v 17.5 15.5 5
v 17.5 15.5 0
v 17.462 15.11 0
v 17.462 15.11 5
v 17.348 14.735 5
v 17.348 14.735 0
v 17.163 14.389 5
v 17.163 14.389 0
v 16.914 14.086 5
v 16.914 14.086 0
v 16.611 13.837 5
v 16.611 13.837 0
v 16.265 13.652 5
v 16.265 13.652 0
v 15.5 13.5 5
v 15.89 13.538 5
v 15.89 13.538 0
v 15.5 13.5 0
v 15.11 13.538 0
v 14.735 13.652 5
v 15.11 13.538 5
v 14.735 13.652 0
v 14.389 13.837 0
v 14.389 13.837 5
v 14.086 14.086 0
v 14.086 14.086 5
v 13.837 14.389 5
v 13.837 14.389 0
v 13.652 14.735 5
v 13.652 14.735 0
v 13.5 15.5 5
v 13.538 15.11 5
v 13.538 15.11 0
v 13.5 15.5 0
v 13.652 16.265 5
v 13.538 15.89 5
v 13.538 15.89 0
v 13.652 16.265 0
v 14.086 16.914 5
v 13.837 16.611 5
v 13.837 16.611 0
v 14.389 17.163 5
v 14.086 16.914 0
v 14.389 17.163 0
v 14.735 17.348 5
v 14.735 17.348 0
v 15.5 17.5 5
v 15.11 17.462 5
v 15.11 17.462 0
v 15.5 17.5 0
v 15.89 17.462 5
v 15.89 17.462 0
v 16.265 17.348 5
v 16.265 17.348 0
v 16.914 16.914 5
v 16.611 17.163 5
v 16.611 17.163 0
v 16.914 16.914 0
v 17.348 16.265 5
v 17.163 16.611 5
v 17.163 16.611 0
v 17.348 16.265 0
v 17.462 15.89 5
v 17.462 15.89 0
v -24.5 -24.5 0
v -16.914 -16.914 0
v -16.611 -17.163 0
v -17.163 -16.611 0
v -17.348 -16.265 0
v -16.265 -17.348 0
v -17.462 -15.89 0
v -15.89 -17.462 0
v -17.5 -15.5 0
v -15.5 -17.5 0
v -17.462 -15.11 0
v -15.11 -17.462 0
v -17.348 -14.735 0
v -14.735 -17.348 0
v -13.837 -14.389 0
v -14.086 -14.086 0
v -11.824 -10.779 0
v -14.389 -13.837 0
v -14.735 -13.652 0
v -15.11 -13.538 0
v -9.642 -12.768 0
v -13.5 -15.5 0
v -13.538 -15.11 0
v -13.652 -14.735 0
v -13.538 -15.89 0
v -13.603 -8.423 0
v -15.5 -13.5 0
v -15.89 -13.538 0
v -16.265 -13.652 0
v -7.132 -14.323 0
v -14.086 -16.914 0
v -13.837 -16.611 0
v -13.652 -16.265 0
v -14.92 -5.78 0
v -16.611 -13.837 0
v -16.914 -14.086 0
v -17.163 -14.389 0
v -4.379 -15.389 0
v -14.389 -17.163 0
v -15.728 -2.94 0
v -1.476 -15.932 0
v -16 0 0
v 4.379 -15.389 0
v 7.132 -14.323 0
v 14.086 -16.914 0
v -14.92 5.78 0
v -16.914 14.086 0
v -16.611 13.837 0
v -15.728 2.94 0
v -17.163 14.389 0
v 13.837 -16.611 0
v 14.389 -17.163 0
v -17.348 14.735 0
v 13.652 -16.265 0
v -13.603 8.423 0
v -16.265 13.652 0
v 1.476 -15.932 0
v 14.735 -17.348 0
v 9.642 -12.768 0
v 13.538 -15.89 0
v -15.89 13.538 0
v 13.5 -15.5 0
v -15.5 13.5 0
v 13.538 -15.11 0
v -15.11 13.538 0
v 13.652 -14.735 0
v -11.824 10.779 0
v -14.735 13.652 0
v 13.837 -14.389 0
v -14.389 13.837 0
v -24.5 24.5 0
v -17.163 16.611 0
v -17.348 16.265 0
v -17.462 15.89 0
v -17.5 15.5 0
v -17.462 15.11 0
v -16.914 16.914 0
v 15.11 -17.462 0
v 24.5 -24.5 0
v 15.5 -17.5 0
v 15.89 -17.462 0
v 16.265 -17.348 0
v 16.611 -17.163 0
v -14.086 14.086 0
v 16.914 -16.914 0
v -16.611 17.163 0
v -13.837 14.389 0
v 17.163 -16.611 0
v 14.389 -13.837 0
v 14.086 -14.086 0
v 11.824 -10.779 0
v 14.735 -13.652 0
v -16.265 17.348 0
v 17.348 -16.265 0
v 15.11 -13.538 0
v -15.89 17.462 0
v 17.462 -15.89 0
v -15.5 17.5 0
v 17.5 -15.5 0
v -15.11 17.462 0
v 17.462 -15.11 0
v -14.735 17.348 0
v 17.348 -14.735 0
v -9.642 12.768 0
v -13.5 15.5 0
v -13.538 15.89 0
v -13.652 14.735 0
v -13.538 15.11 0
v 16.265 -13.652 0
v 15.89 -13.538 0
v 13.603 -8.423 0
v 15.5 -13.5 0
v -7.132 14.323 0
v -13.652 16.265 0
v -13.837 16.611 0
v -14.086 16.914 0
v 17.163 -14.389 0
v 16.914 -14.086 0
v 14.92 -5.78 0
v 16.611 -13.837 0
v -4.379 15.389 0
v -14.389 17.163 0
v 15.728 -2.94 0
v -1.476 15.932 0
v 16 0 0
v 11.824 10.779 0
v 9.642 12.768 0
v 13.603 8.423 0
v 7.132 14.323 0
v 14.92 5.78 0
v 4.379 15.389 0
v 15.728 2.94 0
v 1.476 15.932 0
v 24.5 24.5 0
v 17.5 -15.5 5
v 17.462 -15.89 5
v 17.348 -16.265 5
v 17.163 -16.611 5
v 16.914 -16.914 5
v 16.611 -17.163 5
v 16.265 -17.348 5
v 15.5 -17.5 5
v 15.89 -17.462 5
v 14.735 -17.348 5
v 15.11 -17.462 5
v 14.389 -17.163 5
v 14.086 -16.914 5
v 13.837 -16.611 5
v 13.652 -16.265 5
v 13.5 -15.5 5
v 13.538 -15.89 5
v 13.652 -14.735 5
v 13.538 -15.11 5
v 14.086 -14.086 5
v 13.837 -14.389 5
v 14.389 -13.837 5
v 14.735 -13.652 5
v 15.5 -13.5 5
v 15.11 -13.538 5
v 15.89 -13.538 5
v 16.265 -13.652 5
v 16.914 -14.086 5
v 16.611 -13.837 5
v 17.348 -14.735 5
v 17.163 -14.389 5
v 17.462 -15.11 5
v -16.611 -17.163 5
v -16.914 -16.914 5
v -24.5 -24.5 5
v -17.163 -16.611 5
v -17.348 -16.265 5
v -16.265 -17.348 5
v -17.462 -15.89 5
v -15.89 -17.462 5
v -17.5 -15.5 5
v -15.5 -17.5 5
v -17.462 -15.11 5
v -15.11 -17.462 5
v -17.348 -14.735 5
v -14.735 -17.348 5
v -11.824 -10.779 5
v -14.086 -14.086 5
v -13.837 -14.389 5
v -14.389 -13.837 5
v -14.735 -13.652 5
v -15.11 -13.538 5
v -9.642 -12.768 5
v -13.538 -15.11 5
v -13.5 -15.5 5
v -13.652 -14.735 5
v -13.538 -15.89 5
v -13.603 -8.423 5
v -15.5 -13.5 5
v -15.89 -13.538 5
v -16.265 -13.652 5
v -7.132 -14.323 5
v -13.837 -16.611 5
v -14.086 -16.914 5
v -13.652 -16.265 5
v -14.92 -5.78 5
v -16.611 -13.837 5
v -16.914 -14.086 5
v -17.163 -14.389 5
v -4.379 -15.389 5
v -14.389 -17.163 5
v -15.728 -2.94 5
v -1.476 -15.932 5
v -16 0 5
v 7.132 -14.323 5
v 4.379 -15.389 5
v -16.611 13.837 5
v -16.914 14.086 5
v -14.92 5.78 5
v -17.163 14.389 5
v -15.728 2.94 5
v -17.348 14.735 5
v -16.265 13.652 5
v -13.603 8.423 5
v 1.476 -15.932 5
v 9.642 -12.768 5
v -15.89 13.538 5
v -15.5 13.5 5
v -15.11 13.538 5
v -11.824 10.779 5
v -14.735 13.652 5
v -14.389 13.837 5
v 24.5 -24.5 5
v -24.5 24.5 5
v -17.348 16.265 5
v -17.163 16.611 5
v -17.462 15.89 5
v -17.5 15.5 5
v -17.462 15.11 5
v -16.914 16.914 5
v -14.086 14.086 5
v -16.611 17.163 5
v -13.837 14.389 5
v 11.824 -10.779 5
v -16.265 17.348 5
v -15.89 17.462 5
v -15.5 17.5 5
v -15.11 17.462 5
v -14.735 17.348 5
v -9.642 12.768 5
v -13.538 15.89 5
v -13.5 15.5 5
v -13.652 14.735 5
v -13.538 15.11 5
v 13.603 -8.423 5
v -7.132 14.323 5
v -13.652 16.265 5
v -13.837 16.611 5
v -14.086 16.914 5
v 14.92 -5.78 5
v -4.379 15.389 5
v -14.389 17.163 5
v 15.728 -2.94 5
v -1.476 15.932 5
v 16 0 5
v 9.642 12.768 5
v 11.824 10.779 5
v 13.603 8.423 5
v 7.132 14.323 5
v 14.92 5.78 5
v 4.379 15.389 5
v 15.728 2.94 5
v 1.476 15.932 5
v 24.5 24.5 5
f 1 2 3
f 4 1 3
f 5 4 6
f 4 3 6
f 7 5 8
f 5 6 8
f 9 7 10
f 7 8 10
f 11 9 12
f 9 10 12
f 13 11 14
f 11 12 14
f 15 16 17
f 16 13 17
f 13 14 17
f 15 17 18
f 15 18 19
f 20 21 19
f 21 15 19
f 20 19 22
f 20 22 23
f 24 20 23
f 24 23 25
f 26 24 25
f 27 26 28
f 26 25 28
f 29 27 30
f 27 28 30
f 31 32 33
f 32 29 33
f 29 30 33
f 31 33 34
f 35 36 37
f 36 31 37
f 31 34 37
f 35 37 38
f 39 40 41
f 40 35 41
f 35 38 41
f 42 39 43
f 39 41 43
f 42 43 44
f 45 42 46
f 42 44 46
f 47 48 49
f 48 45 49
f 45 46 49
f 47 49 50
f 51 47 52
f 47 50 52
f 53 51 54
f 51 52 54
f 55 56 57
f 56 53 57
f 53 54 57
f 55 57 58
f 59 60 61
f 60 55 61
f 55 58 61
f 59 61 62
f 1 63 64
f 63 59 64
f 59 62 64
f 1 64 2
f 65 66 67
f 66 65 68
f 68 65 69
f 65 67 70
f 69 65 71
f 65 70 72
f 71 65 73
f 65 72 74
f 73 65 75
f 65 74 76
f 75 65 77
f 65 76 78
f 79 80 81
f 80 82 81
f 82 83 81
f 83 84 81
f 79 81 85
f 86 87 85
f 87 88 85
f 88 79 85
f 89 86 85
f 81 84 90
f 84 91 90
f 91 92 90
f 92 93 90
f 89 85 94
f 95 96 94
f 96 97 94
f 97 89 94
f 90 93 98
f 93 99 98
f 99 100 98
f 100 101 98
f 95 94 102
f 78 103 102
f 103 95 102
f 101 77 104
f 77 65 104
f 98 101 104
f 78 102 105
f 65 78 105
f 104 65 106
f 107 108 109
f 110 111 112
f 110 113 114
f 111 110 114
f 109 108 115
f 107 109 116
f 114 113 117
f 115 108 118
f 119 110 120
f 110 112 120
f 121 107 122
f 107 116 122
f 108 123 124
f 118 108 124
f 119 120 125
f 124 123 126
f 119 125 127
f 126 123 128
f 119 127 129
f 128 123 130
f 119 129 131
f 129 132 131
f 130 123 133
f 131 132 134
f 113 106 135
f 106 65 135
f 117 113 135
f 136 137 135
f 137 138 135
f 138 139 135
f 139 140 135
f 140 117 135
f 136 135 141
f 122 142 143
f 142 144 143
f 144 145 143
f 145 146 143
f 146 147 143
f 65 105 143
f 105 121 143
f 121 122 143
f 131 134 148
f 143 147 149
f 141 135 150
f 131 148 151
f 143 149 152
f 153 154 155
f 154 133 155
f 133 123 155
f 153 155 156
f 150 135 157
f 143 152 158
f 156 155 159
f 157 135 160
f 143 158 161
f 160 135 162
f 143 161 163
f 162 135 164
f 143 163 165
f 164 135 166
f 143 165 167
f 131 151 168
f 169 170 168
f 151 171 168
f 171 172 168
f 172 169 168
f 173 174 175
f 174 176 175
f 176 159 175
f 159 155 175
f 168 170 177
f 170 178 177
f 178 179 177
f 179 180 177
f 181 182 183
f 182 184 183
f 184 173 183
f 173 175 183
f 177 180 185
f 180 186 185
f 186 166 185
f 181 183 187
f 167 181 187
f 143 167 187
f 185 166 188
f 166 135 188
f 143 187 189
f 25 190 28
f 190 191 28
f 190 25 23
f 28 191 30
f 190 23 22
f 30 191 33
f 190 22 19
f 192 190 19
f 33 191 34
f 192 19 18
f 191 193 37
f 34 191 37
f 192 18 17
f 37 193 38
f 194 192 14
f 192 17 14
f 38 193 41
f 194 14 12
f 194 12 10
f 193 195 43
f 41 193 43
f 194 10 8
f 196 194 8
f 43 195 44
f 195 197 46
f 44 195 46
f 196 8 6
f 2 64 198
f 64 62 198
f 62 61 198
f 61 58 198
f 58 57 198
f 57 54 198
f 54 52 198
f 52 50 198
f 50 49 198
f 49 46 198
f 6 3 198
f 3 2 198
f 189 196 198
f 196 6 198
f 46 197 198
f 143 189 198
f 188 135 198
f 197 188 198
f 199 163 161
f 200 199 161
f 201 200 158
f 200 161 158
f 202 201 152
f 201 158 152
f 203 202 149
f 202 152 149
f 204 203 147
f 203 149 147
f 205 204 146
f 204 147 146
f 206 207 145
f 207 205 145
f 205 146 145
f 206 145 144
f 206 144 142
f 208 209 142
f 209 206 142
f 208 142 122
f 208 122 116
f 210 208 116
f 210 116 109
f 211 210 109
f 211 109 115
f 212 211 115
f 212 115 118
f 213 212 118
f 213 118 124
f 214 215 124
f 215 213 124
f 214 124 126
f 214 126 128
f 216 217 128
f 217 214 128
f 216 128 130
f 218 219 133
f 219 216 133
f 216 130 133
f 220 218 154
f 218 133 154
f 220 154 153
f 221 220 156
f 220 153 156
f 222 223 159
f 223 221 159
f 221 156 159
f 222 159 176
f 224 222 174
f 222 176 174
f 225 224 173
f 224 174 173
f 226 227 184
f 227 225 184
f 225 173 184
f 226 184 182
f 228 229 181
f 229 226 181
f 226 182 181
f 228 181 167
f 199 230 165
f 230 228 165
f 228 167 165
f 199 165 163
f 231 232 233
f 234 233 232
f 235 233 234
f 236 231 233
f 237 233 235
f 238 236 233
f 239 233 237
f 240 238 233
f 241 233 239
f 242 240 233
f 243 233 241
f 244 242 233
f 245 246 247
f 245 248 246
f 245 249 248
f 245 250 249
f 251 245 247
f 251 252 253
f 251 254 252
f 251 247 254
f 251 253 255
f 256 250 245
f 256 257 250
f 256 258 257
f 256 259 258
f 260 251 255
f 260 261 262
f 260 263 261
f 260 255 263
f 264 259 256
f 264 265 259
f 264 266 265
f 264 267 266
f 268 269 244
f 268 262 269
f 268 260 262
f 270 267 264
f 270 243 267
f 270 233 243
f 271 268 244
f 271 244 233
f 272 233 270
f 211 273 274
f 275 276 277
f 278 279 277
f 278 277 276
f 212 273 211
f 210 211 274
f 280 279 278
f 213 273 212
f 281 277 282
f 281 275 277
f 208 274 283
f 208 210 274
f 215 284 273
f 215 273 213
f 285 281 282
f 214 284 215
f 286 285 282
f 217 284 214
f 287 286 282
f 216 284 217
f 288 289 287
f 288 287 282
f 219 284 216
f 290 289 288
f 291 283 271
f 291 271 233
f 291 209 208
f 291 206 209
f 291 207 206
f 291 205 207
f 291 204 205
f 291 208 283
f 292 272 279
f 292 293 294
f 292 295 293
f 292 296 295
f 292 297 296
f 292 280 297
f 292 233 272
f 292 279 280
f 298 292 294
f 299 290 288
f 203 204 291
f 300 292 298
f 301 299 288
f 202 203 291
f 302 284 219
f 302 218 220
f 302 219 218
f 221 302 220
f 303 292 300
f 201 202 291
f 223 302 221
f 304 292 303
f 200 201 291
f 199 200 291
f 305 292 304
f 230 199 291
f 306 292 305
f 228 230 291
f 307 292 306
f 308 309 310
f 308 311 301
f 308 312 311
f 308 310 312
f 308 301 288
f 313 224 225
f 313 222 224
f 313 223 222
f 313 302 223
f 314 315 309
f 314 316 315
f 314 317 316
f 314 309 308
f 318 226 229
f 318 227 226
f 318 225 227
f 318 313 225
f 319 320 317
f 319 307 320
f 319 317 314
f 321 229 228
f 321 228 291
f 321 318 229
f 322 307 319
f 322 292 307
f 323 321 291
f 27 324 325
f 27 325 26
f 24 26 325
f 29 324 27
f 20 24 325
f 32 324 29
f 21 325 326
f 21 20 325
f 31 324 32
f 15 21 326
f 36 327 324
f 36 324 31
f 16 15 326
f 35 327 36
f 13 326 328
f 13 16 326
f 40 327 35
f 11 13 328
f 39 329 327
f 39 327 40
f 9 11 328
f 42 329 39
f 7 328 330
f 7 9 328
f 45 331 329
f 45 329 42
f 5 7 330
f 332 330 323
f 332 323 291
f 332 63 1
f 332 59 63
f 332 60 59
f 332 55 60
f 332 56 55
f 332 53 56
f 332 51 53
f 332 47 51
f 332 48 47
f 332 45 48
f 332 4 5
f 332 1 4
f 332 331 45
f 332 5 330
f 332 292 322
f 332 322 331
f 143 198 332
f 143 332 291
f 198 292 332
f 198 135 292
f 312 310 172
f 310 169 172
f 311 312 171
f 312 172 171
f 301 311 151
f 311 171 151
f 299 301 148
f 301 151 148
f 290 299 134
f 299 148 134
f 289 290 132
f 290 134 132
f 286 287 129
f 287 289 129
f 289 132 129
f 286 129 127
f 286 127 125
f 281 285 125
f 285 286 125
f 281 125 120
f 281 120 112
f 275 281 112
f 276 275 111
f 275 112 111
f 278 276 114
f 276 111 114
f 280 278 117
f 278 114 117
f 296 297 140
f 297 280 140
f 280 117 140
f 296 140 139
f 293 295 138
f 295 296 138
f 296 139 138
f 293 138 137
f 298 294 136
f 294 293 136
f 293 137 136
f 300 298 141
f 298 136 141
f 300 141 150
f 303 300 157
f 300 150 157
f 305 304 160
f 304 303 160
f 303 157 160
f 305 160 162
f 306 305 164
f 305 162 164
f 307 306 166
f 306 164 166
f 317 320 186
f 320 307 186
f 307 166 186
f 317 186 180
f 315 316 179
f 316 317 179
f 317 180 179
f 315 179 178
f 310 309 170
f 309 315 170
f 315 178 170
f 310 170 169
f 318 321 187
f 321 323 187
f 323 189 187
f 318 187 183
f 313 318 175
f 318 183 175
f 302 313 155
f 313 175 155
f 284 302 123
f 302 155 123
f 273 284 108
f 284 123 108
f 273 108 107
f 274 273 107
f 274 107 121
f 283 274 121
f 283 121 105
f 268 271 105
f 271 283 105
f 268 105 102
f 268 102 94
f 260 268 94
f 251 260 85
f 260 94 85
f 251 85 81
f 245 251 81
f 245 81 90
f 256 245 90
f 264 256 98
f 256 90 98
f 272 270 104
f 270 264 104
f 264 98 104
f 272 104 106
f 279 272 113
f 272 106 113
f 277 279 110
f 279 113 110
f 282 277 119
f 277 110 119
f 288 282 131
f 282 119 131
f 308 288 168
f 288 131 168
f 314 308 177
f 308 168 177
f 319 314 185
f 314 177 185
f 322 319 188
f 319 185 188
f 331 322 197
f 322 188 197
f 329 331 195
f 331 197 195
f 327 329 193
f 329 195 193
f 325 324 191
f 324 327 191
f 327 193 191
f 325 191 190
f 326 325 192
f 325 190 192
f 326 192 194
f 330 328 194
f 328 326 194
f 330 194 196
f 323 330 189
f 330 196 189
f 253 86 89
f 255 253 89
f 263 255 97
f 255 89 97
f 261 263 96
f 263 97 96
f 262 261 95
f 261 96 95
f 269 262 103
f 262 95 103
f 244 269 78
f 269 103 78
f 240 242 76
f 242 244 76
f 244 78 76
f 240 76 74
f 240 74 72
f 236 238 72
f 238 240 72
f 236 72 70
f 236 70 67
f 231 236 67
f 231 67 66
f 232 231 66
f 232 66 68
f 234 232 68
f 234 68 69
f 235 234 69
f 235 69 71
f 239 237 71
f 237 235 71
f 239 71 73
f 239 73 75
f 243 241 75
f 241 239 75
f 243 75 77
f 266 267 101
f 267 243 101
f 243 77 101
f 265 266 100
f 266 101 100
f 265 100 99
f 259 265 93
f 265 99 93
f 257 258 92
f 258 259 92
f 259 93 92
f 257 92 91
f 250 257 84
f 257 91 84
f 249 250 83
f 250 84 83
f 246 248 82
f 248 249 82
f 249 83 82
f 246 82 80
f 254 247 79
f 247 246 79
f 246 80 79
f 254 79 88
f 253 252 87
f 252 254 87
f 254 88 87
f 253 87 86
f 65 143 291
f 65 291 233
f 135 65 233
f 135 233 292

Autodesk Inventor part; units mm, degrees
ref_plane "YZ Plane" through (0, 0, 0) normal (1, 0, 0) x (0, 1, 0)
ref_plane "XZ Plane" through (0, 0, 0) normal (0, 1, 0) x (-1, 0, 0)
ref_plane "XY Plane" through (0, 0, 0) normal (0, 0, 1) x (1, 0, 0)
sketch "Boceto1" plane through (0, 0, 0) normal (0, 0, 1) x (1, 0, 0)
  line L0 (-24.5, 24.5) -> (24.5, 24.5)
  line L1 (24.5, 24.5) -> (24.5, -24.5)
  line L2 (24.5, -24.5) -> (-24.5, -24.5)
  line L3 (-24.5, -24.5) -> (-24.5, 24.5)
  line L4 (-24.5, 24.5) -> (24.5, -24.5) construction
  line L5 (24.5, 24.5) -> (-24.5, -24.5) construction
  circle A0 centre (15.5, 15.5) radius 2
  circle A1 centre (-15.5, 15.5) radius 2
  circle A2 centre (-15.5, -15.5) radius 2
  circle A3 centre (15.5, -15.5) radius 2
  circle A4 centre (0, 0) radius 16
  dimension "d0" = 49
  dimension "d1" = 49
  dimension "d2" = 4
  dimension "d3" = 9
  dimension "d6" = 360
  dimension "d10" = 32
extrude "Extrusión1" add sketch "Boceto1" along normal blind 5
properties part number "depth-camera"
